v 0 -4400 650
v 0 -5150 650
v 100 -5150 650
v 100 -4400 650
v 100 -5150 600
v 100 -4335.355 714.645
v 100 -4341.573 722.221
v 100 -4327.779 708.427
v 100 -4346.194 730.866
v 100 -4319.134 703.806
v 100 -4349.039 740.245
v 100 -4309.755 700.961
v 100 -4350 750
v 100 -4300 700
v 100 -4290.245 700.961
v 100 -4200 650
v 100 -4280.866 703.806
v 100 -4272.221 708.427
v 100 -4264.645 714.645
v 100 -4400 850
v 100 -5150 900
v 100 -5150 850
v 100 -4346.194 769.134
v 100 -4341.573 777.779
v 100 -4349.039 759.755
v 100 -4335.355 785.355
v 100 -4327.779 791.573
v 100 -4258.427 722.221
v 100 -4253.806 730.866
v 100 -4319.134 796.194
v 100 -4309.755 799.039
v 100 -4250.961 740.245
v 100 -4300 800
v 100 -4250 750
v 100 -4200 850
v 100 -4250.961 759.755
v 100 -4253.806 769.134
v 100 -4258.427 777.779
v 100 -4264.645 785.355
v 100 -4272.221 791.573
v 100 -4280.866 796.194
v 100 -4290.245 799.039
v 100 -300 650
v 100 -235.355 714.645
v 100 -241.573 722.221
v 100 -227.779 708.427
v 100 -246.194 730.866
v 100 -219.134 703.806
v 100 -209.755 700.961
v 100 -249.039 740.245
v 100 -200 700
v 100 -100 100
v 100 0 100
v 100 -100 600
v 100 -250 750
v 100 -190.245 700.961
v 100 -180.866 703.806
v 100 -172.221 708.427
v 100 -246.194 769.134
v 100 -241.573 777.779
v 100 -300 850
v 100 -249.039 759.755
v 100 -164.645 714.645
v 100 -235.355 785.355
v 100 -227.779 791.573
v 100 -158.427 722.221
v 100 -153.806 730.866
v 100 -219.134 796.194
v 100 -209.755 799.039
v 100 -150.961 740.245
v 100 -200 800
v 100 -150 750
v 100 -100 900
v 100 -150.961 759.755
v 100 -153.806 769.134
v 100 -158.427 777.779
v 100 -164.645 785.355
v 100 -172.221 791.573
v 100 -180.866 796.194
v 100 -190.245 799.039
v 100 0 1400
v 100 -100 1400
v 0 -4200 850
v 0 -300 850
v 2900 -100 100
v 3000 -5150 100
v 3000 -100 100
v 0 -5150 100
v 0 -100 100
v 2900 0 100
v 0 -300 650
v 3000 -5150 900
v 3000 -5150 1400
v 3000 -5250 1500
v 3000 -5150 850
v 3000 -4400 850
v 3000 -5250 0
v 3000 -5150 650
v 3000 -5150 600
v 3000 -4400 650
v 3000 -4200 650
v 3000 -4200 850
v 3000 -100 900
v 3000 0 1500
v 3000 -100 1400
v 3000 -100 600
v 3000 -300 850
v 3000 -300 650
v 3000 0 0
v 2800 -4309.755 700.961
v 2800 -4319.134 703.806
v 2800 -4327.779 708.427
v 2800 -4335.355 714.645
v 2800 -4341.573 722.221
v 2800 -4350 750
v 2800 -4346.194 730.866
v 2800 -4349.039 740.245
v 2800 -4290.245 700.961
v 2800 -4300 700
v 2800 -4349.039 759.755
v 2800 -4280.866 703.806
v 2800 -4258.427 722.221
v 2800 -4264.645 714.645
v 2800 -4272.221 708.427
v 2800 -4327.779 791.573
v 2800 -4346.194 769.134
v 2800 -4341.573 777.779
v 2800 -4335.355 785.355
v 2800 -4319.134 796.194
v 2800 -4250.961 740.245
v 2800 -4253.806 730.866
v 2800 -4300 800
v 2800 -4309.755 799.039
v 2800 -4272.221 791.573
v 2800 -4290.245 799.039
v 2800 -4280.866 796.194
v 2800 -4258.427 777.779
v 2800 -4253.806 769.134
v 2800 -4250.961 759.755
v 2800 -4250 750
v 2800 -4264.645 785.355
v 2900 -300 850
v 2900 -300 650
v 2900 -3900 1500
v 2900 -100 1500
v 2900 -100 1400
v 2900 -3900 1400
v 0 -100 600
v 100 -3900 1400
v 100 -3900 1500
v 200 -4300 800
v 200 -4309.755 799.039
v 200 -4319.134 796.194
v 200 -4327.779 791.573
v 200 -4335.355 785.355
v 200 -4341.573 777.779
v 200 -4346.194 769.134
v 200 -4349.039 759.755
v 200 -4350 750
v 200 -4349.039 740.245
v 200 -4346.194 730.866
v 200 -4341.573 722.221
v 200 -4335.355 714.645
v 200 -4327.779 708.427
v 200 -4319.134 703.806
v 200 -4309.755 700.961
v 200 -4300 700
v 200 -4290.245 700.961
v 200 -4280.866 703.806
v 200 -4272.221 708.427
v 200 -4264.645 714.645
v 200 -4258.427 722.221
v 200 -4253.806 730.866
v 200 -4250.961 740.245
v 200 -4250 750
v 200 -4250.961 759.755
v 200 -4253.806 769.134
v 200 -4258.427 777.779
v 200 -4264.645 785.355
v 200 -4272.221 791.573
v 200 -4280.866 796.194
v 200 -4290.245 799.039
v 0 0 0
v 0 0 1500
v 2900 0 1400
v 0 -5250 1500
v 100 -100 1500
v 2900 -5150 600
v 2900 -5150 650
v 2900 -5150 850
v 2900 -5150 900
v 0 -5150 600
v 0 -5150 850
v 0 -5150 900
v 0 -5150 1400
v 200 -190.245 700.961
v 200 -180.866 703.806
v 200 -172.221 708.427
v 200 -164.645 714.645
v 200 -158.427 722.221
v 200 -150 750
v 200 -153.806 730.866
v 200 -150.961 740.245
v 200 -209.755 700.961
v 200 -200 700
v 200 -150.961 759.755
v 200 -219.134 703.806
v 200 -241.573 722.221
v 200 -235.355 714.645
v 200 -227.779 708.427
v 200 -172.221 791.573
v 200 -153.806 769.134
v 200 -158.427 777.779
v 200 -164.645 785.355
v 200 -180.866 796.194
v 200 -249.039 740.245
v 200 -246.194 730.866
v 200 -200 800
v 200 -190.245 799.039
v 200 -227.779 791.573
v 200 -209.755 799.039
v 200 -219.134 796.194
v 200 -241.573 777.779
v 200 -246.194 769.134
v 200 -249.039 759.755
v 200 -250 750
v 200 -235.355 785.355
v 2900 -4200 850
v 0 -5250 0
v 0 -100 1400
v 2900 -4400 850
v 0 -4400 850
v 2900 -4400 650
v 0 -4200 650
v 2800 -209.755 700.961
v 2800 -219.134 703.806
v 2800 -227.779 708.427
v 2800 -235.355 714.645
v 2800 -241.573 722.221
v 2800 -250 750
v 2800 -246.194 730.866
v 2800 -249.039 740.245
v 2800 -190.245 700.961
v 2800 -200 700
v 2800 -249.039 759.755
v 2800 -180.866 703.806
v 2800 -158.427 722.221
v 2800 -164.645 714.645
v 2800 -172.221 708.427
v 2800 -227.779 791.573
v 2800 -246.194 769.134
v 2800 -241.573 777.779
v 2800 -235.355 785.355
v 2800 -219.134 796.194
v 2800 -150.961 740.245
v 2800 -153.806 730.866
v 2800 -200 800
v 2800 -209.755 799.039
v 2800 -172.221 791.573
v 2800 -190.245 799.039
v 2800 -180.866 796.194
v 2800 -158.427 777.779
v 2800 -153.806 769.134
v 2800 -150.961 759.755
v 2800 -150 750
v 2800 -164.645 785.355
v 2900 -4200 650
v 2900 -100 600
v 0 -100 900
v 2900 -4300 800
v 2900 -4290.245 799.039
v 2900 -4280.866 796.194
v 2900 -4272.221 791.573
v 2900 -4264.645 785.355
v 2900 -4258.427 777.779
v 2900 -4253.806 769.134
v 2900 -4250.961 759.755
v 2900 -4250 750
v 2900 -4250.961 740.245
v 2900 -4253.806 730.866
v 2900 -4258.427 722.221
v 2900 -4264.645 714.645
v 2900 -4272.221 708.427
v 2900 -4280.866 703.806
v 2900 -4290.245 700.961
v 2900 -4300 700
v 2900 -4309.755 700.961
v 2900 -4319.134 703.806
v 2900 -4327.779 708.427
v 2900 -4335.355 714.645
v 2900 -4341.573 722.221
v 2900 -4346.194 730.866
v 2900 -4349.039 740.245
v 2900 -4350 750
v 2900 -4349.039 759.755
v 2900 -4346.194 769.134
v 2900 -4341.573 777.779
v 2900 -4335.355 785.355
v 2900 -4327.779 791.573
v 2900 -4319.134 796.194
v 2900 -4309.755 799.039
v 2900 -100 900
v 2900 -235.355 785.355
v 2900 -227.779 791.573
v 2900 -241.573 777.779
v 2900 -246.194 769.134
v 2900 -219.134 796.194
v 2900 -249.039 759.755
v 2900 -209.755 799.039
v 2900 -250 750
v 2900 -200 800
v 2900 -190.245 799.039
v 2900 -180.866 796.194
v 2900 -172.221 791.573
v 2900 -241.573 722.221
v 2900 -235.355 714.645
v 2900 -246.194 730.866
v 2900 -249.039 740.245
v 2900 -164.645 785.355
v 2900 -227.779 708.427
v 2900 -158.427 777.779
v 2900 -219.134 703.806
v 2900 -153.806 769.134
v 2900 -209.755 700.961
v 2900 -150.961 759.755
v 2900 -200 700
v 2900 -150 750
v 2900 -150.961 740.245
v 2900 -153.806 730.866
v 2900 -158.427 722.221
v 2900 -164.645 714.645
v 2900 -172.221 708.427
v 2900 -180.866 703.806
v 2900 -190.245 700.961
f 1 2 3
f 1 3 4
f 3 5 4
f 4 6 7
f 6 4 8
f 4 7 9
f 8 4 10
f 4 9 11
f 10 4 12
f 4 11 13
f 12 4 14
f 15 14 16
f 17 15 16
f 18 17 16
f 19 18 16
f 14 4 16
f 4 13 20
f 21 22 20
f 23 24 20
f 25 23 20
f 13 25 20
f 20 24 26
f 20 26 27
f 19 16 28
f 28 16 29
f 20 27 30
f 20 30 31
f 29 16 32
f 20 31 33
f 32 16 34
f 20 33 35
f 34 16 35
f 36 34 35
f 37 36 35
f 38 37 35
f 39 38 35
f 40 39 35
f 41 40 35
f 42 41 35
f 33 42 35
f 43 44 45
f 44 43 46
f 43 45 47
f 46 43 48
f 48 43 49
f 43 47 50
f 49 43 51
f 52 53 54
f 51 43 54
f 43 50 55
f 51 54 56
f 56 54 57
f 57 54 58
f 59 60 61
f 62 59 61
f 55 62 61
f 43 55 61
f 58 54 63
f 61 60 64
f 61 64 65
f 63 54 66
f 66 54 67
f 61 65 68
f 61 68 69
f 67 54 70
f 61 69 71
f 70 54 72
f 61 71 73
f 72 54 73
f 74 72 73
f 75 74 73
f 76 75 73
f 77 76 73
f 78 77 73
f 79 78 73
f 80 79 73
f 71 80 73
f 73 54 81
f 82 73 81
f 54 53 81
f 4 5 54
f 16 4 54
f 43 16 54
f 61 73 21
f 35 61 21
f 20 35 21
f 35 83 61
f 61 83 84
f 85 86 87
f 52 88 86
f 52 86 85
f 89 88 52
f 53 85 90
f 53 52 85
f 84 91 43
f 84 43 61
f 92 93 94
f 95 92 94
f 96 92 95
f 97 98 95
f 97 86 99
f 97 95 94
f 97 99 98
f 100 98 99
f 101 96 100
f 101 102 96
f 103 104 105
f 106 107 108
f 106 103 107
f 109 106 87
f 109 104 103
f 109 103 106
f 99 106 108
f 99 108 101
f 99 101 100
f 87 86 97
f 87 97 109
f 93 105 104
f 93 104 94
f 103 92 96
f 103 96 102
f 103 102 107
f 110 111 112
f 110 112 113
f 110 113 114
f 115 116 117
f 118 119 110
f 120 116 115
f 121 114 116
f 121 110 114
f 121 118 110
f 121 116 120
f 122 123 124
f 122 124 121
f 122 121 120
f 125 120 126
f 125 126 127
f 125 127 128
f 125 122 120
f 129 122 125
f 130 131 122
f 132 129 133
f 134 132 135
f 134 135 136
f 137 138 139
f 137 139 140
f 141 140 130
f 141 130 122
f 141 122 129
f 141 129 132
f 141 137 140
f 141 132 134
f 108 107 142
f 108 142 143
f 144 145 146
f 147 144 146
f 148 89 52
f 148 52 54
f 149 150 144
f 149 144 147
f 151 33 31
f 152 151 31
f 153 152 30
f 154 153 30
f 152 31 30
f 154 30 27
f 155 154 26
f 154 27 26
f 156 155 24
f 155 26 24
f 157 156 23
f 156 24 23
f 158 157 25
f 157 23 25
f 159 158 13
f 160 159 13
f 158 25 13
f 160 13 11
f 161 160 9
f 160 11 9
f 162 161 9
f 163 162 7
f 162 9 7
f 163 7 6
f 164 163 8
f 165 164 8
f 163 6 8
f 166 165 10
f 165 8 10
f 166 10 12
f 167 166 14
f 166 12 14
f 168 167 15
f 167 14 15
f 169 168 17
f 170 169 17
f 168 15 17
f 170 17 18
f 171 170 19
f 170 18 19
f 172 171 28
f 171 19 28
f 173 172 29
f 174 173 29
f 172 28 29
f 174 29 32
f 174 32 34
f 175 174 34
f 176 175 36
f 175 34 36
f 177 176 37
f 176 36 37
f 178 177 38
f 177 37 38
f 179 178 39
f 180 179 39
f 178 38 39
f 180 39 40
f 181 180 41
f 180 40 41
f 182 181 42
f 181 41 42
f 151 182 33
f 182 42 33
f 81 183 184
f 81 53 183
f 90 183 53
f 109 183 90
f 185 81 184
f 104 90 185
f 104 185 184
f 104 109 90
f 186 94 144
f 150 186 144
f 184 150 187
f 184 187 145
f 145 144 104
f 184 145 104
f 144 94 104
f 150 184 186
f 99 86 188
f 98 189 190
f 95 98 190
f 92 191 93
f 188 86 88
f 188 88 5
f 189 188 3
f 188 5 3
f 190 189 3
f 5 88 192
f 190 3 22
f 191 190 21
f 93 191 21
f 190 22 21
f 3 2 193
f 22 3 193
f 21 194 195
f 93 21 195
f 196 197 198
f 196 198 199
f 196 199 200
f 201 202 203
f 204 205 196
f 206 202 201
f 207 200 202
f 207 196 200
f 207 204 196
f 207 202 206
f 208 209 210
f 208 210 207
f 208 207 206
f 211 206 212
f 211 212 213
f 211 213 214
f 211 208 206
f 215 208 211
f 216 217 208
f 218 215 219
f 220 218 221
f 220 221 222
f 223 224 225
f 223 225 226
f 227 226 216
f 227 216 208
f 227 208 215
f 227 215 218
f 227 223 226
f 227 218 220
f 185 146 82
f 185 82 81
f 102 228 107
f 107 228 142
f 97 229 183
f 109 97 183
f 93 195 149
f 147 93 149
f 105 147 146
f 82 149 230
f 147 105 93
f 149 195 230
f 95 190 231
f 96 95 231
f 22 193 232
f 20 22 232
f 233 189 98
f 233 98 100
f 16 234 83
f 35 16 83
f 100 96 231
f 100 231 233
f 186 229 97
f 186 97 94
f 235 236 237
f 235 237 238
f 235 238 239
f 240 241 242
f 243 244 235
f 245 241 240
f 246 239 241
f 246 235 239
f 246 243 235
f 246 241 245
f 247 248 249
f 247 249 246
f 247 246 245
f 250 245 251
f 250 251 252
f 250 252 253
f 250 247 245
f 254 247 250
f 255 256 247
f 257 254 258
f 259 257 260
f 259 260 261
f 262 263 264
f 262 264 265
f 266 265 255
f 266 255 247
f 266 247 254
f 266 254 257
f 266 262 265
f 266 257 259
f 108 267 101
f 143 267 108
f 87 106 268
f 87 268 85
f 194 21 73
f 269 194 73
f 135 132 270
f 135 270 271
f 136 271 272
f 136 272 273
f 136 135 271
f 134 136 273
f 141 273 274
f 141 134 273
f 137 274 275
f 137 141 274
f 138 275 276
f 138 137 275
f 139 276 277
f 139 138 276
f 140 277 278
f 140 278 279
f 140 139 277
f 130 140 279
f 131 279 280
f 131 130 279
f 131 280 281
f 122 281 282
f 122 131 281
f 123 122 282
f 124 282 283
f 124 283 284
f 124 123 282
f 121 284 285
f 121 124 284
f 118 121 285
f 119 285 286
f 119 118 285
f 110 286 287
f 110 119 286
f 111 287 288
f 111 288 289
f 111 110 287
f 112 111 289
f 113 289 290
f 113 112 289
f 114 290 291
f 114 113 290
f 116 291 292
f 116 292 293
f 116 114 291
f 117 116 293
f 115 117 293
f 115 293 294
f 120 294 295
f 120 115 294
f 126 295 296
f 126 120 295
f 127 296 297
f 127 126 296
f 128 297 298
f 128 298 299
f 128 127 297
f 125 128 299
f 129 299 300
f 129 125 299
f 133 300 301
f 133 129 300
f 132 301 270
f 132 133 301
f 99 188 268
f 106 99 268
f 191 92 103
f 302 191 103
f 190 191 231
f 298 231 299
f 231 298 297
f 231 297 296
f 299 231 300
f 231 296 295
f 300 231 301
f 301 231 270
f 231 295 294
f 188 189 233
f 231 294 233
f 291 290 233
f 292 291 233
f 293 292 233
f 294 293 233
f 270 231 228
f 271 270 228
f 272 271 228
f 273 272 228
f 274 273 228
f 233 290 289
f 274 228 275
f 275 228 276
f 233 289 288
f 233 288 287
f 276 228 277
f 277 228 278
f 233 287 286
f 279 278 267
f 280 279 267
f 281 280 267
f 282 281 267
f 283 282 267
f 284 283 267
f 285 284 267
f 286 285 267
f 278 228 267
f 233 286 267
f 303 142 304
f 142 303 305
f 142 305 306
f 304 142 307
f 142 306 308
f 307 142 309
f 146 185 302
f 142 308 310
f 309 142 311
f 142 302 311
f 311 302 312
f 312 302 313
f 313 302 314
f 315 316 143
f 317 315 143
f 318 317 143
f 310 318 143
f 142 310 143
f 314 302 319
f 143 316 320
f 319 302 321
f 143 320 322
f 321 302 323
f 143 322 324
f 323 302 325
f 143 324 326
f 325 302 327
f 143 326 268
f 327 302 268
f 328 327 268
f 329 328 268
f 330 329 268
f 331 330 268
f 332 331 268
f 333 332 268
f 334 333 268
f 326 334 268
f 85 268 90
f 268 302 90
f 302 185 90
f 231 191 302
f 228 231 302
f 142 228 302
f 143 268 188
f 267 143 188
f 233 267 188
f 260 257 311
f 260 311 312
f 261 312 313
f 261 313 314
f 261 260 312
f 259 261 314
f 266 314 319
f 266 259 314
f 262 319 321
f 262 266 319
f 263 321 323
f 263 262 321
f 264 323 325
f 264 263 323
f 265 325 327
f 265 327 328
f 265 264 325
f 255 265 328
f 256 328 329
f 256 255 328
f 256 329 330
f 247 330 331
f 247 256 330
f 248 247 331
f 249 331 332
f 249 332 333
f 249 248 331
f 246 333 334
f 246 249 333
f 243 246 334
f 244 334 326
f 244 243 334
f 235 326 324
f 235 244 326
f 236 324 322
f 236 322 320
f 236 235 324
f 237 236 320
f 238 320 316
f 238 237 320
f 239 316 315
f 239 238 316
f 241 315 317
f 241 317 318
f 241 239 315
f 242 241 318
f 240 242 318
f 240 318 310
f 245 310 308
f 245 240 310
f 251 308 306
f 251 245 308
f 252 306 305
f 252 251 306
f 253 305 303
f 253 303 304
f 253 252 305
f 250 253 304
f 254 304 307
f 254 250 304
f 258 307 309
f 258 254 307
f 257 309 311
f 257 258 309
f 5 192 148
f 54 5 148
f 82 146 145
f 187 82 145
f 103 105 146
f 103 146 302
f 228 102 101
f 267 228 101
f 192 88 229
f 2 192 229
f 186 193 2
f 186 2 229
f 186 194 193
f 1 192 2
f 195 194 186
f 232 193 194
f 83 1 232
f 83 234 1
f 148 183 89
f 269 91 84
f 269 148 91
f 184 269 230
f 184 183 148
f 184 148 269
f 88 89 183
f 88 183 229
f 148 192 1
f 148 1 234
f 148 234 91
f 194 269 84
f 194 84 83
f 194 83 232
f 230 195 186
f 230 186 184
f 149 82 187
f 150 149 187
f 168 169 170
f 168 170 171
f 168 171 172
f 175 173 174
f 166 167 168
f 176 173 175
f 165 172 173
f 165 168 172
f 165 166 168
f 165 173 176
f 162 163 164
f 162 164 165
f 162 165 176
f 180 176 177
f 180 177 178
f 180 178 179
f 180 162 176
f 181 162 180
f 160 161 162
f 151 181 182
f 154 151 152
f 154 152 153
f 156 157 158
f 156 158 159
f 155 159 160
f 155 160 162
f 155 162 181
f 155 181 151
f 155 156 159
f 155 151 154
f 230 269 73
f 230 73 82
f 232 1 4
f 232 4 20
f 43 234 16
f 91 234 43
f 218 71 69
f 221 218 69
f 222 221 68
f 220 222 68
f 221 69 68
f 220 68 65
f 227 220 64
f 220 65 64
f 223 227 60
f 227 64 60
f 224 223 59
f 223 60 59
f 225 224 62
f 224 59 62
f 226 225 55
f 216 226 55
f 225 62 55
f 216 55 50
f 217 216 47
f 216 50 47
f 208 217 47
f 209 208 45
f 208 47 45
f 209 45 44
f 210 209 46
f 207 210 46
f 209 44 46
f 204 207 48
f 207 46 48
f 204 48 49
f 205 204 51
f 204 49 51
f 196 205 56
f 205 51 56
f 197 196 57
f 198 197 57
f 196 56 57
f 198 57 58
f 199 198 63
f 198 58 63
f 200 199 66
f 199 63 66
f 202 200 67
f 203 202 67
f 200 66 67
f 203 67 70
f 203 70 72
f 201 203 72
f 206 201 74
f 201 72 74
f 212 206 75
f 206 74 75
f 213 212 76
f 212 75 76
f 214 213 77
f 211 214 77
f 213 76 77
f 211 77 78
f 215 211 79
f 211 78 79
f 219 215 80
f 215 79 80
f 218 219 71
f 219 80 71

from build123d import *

# Parameters (mm, degrees)
SKETCH1_W            = 3000
SKETCH1_H            = 5000
BOSS_EXTRUDE1_DEPTH  = 100
SKETCH2_W            = 3000
SKETCH2_H            = 100
BOSS_EXTRUDE2_DEPTH  = 1400
SKETCH3_W            = 100
SKETCH3_H            = 100
BOSS_EXTRUDE3_DEPTH  = 4900
SKETCH4_W            = 100
SKETCH4_H            = 100
BOSS_EXTRUDE4_DEPTH  = 4900
SKETCH6_W            = 100
SKETCH6_H            = 1000
BOSS_EXTRUDE5_DEPTH  = 2800
SKETCH22_W           = 300
SKETCH22_H           = 4900
BOSS_EXTRUDE17_DEPTH = 100
SKETCH23_W           = 300
SKETCH23_H           = 4900
BOSS_EXTRUDE18_DEPTH = 100
SKETCH24_W           = 200
SKETCH24_H           = 4900
CUT_EXTRUDE1_DEPTH   = 6021.797289396
SKETCH25_W           = 200
SKETCH25_H           = 200
BOSS_EXTRUDE19_DEPTH = 100
SKETCH26_W           = 200
SKETCH26_H           = 200
BOSS_EXTRUDE20_DEPTH = 100
SKETCH31_W           = 1300
SKETCH31_H           = 100
BOSS_EXTRUDE23_DEPTH = 100
SKETCH33_W           = 1300
SKETCH33_H           = 100
BOSS_EXTRUDE24_DEPTH = 100
SKETCH43_W           = 1500
SKETCH43_H           = 250
BOSS_EXTRUDE32_DEPTH = 3000
SKETCH44_W           = 500
SKETCH44_H           = 250
CUT_EXTRUDE2_DEPTH   = 6230.967897189
SKETCH45_W           = 500
SKETCH45_H           = 250
CUT_EXTRUDE3_DEPTH   = 3000
SKETCH46_W           = 200
SKETCH46_H           = 250
CUT_EXTRUDE4_DEPTH   = 3000
SKETCH49_W           = 2800
SKETCH49_H           = 300
CUT_EXTRUDE5_DEPTH   = 250
SKETCH34_W           = 100
SKETCH34_H           = 100
BOSS_EXTRUDE25_DEPTH = 2800
SKETCH36_W           = 200
SKETCH36_H           = 200
BOSS_EXTRUDE26_DEPTH = 100
SKETCH37_W           = 200
SKETCH37_H           = 200
BOSS_EXTRUDE27_DEPTH = 100
SKETCH38_R           = 50
BOSS_EXTRUDE28_DEPTH = 100
SKETCH39_R           = 50
BOSS_EXTRUDE29_DEPTH = 100
BOSS_EXTRUDE30_START = 100
SKETCH40_R           = 50
BOSS_EXTRUDE30_DEPTH = 100
BOSS_EXTRUDE31_START = 100
SKETCH42_R           = 50
BOSS_EXTRUDE31_DEPTH = 100


with BuildPart() as part:
    # Sketch1 → Boss-Extrude1 (new body)
    with BuildSketch(Plane.XY):
        with Locations((1500, -2500)):
            Rectangle(SKETCH1_W, SKETCH1_H)
    extrude(amount=BOSS_EXTRUDE1_DEPTH)

    # Sketch2 → Boss-Extrude2 (add)
    with BuildSketch(Plane.XY.offset(100)):
        with Locations((1500, -4950)):
            Rectangle(SKETCH2_W, SKETCH2_H)
    extrude(amount=BOSS_EXTRUDE2_DEPTH)

    # Sketch3 → Boss-Extrude3 (add)
    with BuildSketch(Plane(origin=(0, -4900, 0), x_dir=(1, 0, 0), z_dir=(0, 1, 0))):
        with Locations((50, -1450)):
            Rectangle(SKETCH3_W, SKETCH3_H)
    extrude(amount=BOSS_EXTRUDE3_DEPTH)

    # Sketch4 → Boss-Extrude4 (add)
    with BuildSketch(Plane(origin=(0, -4900, 0), x_dir=(1, 0, 0), z_dir=(0, 1, 0))):
        with Locations((2950, -1450)):
            Rectangle(SKETCH4_W, SKETCH4_H)
    extrude(amount=BOSS_EXTRUDE4_DEPTH)

    # Sketch6 → Boss-Extrude5 (add)
    with BuildSketch(Plane(origin=(100, 0, 0), x_dir=(0, 0, -1), z_dir=(1, 0, 0))):
        with Locations((-1450, -4400)):
            Rectangle(SKETCH6_W, SKETCH6_H)
    extrude(amount=BOSS_EXTRUDE5_DEPTH)

    # Sketch22 → Boss-Extrude17 (add)
    with BuildSketch(Plane(origin=(3000, 0, 0), x_dir=(0, 0, -1), z_dir=(1, 0, 0))):
        with Locations((-750, -2450)):
            Rectangle(SKETCH22_W, SKETCH22_H)
    extrude(amount=-BOSS_EXTRUDE17_DEPTH)

    # Sketch23 → Boss-Extrude18 (add)
    with BuildSketch(Plane.ZY):
        with Locations((750, -2450)):
            Rectangle(SKETCH23_W, SKETCH23_H)
    extrude(amount=-BOSS_EXTRUDE18_DEPTH)

    # Sketch24 → Cut-Extrude1 (cut, through all)
    with BuildSketch(Plane.ZY):
        with Locations((750, -2450)):
            Rectangle(SKETCH24_W, SKETCH24_H)
    extrude(amount=-CUT_EXTRUDE1_DEPTH, mode=Mode.SUBTRACT)

    # Sketch25 → Boss-Extrude19 (add)
    with BuildSketch(Plane.ZY):
        with Locations((750, -4300)):
            Rectangle(SKETCH25_W, SKETCH25_H)
    extrude(amount=-BOSS_EXTRUDE19_DEPTH)

    # Sketch26 → Boss-Extrude20 (add)
    with BuildSketch(Plane(origin=(3000, 0, 0), x_dir=(0, 0, -1), z_dir=(1, 0, 0))):
        with Locations((-750, -4300)):
            Rectangle(SKETCH26_W, SKETCH26_H)
    extrude(amount=-BOSS_EXTRUDE20_DEPTH)

    # Sketch31 → Boss-Extrude23 (add)
    with BuildSketch(Plane(origin=(3000, 0, 0), x_dir=(0, 0, -1), z_dir=(1, 0, 0))):
        with Locations((-750, -50)):
            Rectangle(SKETCH31_W, SKETCH31_H)
    extrude(amount=-BOSS_EXTRUDE23_DEPTH)

    # Sketch33 → Boss-Extrude24 (add)
    with BuildSketch(Plane.ZY):
        with Locations((750, -50)):
            Rectangle(SKETCH33_W, SKETCH33_H)
    extrude(amount=-BOSS_EXTRUDE24_DEPTH)

    # Sketch43 → Boss-Extrude32 (add)
    with BuildSketch(Plane.ZY):
        with Locations((750, -5125)):
            Rectangle(SKETCH43_W, SKETCH43_H)
    extrude(amount=-BOSS_EXTRUDE32_DEPTH)

    # Sketch44 → Cut-Extrude2 (cut, through all)
    with BuildSketch(Plane.ZY):
        with Locations((350, -5025)):
            Rectangle(SKETCH44_W, SKETCH44_H)
    extrude(amount=-CUT_EXTRUDE2_DEPTH, mode=Mode.SUBTRACT)

    # Sketch45 → Cut-Extrude3 (cut)
    with BuildSketch(Plane.ZY):
        with Locations((1150, -5025)):
            Rectangle(SKETCH45_W, SKETCH45_H)
    extrude(amount=-CUT_EXTRUDE3_DEPTH, mode=Mode.SUBTRACT)

    # Sketch46 → Cut-Extrude4 (cut)
    with BuildSketch(Plane.ZY):
        with Locations((750, -5025)):
            Rectangle(SKETCH46_W, SKETCH46_H)
    extrude(amount=-CUT_EXTRUDE4_DEPTH, mode=Mode.SUBTRACT)

    # Sketch49 → Cut-Extrude5 (cut)
    with BuildSketch(Plane(origin=(0, -4900, 0), x_dir=(1, 0, 0), z_dir=(0, 1, 0))):
        with Locations((1500, -750)):
            Rectangle(SKETCH49_W, SKETCH49_H)
    extrude(amount=-CUT_EXTRUDE5_DEPTH, mode=Mode.SUBTRACT)

    # Sketch34 → Boss-Extrude25 (add)
    with BuildSketch(Plane.ZY.offset(-2900)):
        with Locations((1450, -50)):
            Rectangle(SKETCH34_W, SKETCH34_H)
    extrude(amount=BOSS_EXTRUDE25_DEPTH)

    # Sketch36 → Boss-Extrude26 (add)
    with BuildSketch(Plane.ZY):
        with Locations((750, -200)):
            Rectangle(SKETCH36_W, SKETCH36_H)
    extrude(amount=-BOSS_EXTRUDE26_DEPTH)

    # Sketch37 → Boss-Extrude27 (add)
    with BuildSketch(Plane(origin=(3000, 0, 0), x_dir=(0, 0, -1), z_dir=(1, 0, 0))):
        with Locations((-750, -200)):
            Rectangle(SKETCH37_W, SKETCH37_H)
    extrude(amount=-BOSS_EXTRUDE27_DEPTH)

    # Sketch38 → Boss-Extrude28 (add)
    with BuildSketch(Plane(origin=(100, 0, 0), x_dir=(0, 0, -1), z_dir=(1, 0, 0))):
        with Locations(Location((-750, -4300, 0), (0, 0, 180))):
            Circle(SKETCH38_R)
    extrude(amount=BOSS_EXTRUDE28_DEPTH)

    # Sketch39 → Boss-Extrude29 (add)
    with BuildSketch(Plane(origin=(100, 0, 0), x_dir=(0, 0, -1), z_dir=(1, 0, 0))):
        with Locations(Location((-750, -200, 0), (0, 0, 180))):
            Circle(SKETCH39_R)
    extrude(amount=BOSS_EXTRUDE29_DEPTH)

    # Sketch40 → Boss-Extrude30 (add)
    with BuildSketch(Plane.ZY.offset(-2900).offset(BOSS_EXTRUDE30_START)):
        with Locations((750, -200)):
            Circle(SKETCH40_R)
    extrude(amount=-BOSS_EXTRUDE30_DEPTH)

    # Sketch42 → Boss-Extrude31 (add)
    with BuildSketch(Plane.ZY.offset(-2900).offset(BOSS_EXTRUDE31_START)):
        with Locations((750, -4300)):
            Circle(SKETCH42_R)
    extrude(amount=-BOSS_EXTRUDE31_DEPTH)


solid = part.part
